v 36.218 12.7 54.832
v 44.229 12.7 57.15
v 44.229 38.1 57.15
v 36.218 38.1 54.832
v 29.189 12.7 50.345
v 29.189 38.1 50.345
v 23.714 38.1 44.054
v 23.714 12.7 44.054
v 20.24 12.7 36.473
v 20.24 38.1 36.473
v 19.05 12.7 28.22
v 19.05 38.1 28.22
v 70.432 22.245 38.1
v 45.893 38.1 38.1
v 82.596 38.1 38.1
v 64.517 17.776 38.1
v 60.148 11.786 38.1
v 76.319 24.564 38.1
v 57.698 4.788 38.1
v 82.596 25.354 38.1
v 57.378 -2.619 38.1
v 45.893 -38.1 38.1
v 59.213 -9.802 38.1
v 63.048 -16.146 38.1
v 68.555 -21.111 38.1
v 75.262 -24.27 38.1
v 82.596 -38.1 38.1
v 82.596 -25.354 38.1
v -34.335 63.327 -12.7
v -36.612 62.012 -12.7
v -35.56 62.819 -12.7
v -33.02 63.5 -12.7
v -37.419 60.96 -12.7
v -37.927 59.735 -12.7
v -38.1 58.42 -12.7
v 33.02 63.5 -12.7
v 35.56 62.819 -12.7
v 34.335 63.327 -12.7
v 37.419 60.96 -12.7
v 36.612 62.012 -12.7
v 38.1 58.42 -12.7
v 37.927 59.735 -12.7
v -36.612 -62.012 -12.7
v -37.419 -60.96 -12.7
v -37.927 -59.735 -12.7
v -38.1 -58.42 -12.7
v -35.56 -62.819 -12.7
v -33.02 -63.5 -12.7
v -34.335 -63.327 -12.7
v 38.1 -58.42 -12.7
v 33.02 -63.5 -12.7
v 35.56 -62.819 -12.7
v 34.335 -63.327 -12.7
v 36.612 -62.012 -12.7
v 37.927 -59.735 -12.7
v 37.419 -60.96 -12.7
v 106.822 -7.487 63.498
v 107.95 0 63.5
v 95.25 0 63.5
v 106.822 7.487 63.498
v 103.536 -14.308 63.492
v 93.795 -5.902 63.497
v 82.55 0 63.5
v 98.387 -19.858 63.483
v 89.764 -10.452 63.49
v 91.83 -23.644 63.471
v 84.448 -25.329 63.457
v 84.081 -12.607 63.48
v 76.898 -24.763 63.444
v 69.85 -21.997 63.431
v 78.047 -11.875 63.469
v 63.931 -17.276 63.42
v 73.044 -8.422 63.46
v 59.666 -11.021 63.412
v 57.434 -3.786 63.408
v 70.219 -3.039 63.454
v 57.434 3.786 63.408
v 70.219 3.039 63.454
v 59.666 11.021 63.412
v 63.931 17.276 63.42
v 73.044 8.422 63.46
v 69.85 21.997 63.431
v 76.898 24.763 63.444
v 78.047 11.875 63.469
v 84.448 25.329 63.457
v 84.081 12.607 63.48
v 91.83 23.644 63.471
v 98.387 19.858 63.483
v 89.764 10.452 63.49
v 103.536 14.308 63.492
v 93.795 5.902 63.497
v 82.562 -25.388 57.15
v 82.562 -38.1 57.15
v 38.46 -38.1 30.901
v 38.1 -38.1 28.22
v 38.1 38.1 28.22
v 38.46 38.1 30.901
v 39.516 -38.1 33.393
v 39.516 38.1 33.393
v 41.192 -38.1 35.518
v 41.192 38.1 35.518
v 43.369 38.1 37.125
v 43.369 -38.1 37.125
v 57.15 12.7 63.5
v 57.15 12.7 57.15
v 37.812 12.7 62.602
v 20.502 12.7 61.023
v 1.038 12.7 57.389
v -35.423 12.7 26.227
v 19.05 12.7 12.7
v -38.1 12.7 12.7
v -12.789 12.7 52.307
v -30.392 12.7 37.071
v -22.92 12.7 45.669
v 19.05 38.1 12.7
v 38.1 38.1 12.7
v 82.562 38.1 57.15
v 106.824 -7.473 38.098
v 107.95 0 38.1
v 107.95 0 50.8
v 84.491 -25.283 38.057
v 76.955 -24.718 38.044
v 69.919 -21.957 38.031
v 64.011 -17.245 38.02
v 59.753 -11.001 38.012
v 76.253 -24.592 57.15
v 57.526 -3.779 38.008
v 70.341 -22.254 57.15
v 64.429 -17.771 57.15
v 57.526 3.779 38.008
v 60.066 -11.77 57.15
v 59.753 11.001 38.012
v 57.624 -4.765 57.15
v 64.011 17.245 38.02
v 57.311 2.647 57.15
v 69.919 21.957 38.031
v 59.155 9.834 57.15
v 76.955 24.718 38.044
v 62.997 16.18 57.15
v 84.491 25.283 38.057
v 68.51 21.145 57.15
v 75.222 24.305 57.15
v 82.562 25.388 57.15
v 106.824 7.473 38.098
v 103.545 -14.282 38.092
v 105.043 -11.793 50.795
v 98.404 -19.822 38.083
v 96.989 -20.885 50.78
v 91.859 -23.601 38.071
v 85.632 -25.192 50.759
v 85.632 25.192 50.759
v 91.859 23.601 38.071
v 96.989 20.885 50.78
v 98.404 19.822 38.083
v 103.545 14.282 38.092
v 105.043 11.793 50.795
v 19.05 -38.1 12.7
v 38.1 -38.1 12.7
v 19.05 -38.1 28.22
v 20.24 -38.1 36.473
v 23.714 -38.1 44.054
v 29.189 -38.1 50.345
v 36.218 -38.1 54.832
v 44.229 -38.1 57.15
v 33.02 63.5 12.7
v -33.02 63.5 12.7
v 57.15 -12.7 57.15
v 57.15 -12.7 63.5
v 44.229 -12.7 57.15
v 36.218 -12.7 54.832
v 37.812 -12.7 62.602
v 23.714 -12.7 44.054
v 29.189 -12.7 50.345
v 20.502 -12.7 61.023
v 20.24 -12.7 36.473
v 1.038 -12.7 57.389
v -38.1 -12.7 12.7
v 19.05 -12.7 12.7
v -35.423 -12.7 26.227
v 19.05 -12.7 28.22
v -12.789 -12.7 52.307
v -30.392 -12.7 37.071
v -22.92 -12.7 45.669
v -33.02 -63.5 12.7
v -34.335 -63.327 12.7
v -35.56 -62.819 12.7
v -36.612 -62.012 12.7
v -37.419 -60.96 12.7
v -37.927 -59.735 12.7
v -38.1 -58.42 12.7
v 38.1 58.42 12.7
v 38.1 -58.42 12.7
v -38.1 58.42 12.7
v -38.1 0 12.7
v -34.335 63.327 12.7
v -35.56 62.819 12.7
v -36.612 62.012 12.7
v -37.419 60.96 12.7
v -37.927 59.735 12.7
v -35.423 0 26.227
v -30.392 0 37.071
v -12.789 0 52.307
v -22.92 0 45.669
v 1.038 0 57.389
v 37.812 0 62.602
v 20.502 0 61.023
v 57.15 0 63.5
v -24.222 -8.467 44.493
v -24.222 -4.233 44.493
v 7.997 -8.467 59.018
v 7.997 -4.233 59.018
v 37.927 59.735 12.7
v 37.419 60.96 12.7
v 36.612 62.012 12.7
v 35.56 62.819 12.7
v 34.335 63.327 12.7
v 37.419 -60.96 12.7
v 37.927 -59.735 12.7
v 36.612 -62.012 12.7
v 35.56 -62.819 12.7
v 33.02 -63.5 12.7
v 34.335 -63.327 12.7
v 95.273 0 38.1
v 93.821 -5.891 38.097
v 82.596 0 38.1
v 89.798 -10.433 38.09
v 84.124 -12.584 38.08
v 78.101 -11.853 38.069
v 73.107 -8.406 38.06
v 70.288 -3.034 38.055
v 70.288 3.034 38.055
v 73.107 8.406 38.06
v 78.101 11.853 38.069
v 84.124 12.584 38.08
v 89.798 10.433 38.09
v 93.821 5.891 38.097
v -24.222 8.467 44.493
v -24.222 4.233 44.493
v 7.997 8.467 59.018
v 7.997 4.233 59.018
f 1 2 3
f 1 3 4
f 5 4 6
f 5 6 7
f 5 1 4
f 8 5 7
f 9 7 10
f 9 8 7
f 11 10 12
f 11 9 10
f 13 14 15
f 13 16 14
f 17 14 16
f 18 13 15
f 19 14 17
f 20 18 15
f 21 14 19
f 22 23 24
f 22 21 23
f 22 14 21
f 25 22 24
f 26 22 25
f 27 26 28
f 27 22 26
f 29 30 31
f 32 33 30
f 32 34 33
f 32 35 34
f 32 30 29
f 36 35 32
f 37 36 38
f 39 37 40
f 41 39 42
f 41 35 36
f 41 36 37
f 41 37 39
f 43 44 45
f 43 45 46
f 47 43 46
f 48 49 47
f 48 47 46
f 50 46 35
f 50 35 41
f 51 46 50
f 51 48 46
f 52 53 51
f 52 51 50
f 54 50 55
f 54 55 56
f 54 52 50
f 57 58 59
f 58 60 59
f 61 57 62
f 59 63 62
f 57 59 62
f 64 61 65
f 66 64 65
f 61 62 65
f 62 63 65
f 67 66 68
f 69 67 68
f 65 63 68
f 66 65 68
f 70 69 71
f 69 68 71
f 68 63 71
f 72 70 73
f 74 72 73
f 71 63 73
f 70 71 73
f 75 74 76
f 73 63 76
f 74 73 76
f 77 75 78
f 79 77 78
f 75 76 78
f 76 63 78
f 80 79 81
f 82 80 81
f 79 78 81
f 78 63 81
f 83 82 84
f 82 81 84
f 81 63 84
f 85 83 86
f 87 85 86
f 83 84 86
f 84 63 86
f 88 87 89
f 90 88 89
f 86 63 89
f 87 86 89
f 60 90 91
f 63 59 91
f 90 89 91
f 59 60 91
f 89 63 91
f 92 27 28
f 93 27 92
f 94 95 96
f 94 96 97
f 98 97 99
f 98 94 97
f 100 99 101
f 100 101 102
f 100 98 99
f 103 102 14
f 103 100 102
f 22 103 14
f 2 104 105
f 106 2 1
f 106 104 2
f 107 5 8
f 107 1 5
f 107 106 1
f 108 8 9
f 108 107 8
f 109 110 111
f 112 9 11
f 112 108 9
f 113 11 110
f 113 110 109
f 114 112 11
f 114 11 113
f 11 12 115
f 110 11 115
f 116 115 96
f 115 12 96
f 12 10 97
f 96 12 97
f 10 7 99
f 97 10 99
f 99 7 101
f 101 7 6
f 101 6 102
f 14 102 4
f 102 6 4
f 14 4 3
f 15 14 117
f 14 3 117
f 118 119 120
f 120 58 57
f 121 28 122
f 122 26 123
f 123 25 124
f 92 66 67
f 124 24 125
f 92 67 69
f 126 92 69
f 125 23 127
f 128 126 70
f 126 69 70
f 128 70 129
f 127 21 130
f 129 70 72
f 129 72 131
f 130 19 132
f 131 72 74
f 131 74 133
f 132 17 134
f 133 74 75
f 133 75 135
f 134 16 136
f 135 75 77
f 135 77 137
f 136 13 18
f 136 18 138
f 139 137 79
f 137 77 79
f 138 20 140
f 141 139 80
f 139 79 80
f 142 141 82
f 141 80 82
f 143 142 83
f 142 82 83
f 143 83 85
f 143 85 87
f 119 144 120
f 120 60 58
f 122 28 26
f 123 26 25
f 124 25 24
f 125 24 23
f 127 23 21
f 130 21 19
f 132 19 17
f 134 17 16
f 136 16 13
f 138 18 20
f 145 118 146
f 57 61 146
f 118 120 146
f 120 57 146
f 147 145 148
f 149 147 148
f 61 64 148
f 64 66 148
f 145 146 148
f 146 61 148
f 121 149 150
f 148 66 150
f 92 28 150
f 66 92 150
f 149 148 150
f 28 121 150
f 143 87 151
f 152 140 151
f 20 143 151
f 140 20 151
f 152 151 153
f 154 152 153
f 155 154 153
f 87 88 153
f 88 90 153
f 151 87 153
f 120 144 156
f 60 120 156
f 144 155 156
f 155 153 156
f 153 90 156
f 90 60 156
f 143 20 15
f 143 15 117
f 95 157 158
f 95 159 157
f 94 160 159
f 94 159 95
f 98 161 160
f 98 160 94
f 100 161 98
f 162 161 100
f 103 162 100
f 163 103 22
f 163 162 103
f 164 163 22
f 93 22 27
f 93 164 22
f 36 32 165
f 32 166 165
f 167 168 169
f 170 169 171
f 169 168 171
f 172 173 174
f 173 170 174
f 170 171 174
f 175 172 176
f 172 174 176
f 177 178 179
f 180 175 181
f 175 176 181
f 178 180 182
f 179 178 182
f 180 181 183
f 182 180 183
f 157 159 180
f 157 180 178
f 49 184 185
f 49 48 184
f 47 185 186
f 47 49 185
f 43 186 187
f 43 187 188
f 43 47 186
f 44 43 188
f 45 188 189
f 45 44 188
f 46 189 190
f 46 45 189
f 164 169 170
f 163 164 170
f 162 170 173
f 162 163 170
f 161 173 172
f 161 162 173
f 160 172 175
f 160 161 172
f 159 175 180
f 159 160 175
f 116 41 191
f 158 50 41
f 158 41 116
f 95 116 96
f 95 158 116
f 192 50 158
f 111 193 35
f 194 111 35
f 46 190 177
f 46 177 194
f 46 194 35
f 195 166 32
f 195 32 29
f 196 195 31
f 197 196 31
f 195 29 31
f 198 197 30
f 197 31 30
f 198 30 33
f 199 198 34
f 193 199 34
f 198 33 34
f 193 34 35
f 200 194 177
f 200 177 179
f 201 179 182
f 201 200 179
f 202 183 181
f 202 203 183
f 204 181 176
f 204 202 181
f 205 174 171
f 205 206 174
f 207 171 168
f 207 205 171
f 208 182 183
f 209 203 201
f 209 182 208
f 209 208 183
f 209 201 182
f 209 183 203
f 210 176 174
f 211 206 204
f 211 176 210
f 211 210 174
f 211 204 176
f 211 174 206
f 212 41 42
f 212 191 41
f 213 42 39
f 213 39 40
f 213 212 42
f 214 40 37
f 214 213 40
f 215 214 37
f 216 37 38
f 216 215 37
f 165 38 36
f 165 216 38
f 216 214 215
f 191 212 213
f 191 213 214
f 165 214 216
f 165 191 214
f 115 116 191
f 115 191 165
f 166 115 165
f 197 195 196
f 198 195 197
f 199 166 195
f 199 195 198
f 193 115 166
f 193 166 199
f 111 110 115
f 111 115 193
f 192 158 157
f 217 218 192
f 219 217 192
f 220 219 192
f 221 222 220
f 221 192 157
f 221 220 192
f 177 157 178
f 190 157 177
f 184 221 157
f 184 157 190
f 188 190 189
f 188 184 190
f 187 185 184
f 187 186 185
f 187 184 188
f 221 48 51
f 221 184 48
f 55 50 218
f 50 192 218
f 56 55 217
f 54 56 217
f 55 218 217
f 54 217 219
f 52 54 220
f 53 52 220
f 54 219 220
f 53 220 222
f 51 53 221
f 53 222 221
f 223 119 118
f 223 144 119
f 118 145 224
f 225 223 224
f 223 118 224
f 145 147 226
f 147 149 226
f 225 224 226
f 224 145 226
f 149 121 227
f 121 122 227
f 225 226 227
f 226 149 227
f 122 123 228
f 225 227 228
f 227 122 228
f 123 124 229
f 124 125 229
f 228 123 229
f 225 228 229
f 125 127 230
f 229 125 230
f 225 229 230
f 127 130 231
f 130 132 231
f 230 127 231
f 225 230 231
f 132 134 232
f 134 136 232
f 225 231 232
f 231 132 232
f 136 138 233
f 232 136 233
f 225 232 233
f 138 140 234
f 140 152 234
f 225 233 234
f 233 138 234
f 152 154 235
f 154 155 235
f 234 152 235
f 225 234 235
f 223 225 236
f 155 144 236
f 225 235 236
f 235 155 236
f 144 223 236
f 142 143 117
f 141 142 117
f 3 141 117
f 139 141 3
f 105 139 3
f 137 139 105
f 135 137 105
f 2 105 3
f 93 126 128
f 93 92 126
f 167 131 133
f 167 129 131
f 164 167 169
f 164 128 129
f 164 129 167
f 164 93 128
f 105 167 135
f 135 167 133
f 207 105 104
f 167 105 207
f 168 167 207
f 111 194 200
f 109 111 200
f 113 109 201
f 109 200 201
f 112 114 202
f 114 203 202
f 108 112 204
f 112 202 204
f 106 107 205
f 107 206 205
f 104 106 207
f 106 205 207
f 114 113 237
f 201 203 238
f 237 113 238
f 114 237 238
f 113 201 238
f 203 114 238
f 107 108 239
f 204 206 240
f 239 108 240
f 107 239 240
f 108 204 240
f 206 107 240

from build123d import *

# Parameters (mm, degrees)
F1_DEPTH = 63.5
F2_DEPTH = 38.1
F3_DEPTH = 12.7
F5_R     = 5.08


with BuildPart() as f1:
    # F0 (on Front) → F1 (new body, symmetric)
    with BuildSketch(Plane.XZ):
        Polygon((-38.1, -12.7), (38.1, -12.7), (38.1, 12.7), (19.05, 12.7), (-38.1, 12.7), align=None)
    extrude(amount=F1_DEPTH, both=True)

    # F0 (on Front) → F2 (join, symmetric)
    with BuildSketch(Plane.XZ):
        with BuildLine():
            Line((19.05, 12.7), (38.1, 12.7))
            Line((38.1, 12.7), (38.1, 28.2195249445))
            ThreePointArc((38.1, 28.2195249445), (40.2827686763, 34.511534195), (45.8931851198, 38.1))
            Line((45.8931851198, 38.1), (57.15, 38.1))
            Line((57.15, 38.1), (57.15, 57.15))
            Line((57.15, 57.15), (44.2286586523, 57.15))
            ThreePointArc((44.2286586523, 57.15), (26.2261671427, 47.395924753), (19.05, 28.2195249445))
            Line((19.05, 28.2195249445), (19.05, 12.7))
        make_face()
        Polygon((82.5615462799, 57.15), (57.15, 57.15), (57.15, 38.1), (82.5961851198, 38.1), align=None)
    extrude(amount=F2_DEPTH, both=True)

    # F0 (on Front) → F3 (join, symmetric)
    with BuildSketch(Plane.XZ):
        with BuildLine():
            add(Edge.make_bspline(
                [(-38.1, 12.7), (-33.8629931211, 55.5353052914), (0, 61.6306401789), (57.15, 63.5)],
                knots=[0, 0, 0, 0, 107.95, 107.95, 107.95, 107.95], degree=3))
            Line((-38.1, 12.7), (19.05, 12.7))
            Line((19.05, 12.7), (19.05, 28.2195249445))
            ThreePointArc((19.05, 28.2195249445), (26.2261671427, 47.395924753), (44.2286586523, 57.15))
            Line((44.2286586523, 57.15), (57.15, 57.15))
            Line((57.15, 57.15), (57.15, 63.5))
        make_face()
    extrude(amount=F3_DEPTH, both=True)

    # F0 (on Front) → F4 (revolve)
    with BuildSketch(Plane.XZ):
        Polygon((107.95, 63.5), (82.55, 63.5), (82.5615462799, 57.15), (82.5961851198, 38.1), (107.95, 38.1), align=None)
    revolve(axis=Axis((82.5730925599, 0, 50.8), (0.0018183088, 0, -0.9999983469)))

    # F5
    f5_edges = [f1.edges().sort_by_distance(p)[0] for p in [
        (38.1, -63.5, 0),
        (-38.1, -63.5, 0),
        (38.1, 63.5, 0),
        (-38.1, 63.5, 0),
    ]]
    fillet(f5_edges, radius=F5_R)


solid = f1.part
